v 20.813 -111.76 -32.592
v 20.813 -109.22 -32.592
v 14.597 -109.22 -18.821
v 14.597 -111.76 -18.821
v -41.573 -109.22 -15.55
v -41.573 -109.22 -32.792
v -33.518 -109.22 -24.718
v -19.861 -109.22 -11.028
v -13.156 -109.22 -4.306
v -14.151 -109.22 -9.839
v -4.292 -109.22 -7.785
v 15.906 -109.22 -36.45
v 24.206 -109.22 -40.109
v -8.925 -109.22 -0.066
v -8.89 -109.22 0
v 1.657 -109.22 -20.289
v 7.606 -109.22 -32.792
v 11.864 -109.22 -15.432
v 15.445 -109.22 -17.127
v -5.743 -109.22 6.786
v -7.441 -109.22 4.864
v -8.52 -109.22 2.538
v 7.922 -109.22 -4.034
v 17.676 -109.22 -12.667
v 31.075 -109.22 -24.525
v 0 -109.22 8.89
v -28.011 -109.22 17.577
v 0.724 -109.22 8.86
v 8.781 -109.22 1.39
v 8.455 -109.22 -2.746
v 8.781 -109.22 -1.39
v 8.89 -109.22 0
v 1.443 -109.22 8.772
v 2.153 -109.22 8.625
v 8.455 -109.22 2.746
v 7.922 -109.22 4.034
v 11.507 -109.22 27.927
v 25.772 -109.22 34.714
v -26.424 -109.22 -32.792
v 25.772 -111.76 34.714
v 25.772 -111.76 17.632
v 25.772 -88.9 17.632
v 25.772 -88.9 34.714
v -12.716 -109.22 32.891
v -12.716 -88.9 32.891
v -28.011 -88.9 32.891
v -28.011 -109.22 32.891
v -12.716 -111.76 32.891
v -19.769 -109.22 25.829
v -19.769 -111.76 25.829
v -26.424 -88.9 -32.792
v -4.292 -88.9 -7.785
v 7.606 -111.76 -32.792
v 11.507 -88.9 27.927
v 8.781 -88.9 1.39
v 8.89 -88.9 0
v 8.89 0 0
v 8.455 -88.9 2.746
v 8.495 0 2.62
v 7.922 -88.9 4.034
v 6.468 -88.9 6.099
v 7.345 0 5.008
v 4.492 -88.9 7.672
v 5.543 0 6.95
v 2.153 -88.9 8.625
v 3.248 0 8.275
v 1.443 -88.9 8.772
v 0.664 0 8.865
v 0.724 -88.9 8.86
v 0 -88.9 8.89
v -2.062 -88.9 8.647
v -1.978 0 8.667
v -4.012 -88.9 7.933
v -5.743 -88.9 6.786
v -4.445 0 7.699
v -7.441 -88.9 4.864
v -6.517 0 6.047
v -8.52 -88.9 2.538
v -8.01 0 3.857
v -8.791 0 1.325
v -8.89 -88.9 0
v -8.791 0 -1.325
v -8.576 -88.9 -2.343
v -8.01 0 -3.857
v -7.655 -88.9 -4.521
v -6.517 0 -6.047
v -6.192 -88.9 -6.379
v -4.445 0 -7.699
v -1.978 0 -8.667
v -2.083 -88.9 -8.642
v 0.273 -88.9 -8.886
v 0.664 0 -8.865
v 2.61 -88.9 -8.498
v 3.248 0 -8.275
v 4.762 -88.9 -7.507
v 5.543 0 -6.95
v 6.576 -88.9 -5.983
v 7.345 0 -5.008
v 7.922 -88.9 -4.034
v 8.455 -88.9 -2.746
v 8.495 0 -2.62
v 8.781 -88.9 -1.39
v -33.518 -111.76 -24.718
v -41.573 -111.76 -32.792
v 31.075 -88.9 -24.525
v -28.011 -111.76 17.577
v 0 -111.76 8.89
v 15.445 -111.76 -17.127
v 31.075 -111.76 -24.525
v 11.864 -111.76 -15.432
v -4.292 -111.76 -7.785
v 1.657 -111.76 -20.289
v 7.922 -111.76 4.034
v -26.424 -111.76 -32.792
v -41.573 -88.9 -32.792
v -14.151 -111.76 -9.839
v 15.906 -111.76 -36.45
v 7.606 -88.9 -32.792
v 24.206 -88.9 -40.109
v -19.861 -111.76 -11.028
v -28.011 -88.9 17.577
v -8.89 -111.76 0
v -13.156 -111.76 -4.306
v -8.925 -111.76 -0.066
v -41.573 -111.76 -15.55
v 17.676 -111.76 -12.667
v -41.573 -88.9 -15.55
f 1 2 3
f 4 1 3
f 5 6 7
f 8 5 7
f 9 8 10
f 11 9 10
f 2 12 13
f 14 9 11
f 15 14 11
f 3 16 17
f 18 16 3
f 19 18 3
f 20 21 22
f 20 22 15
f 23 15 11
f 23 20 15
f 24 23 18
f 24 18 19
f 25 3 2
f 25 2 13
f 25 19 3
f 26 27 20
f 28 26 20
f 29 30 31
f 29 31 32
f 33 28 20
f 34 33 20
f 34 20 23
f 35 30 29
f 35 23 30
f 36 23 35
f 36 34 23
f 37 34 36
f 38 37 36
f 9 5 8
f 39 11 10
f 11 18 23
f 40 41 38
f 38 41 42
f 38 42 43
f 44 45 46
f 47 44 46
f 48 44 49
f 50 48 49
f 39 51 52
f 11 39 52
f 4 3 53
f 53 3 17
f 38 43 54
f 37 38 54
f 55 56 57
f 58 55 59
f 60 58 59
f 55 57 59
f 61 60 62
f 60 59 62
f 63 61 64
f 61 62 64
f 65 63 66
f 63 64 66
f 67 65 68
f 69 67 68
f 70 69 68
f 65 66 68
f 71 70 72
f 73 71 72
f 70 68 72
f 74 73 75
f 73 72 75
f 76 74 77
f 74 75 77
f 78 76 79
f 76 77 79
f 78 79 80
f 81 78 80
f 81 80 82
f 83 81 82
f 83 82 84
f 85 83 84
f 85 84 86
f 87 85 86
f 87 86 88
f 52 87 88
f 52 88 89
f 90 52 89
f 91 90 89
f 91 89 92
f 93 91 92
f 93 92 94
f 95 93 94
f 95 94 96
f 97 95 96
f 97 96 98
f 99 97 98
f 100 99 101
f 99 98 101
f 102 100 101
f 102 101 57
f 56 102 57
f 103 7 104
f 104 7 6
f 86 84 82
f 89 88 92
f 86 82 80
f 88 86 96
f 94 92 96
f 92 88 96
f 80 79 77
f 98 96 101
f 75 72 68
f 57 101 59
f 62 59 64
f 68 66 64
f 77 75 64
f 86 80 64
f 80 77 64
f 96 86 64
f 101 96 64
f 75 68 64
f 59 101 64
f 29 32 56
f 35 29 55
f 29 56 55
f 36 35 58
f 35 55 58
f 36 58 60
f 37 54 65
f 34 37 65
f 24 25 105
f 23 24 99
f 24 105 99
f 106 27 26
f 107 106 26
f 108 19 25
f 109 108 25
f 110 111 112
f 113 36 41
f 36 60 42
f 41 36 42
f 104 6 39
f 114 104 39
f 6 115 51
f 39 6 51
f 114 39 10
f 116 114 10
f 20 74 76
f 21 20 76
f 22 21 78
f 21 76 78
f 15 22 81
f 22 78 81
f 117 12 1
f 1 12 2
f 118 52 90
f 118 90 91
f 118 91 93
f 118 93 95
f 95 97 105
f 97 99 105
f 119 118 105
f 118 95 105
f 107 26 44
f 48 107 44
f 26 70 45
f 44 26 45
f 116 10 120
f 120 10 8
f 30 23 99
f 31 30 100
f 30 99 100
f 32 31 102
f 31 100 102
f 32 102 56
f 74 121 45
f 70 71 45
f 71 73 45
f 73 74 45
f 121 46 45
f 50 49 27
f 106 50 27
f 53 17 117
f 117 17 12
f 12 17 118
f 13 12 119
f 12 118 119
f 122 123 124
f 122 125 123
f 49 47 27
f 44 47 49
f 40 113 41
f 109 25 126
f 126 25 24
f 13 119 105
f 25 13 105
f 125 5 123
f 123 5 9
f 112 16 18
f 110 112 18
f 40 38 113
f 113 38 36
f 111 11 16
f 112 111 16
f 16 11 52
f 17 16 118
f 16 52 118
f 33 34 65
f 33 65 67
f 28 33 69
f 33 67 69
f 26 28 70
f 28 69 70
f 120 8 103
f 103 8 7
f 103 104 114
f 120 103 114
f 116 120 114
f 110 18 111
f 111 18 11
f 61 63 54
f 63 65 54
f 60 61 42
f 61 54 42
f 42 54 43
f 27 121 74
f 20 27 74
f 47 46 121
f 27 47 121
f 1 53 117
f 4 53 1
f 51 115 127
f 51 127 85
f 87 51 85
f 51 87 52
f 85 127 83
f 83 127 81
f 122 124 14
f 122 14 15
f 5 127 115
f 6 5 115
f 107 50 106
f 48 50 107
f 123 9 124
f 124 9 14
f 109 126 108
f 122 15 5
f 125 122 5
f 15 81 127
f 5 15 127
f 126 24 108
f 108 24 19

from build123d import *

# Parameters (mm, degrees)
F0_R     = 8.89
F1_DEPTH = 88.9
F4_DEPTH = 20.32
F6_DEPTH = 2.54


with BuildPart() as f1:
    # F0 (on Front) → F1 (new body)
    with BuildSketch(Plane.XZ):
        Circle(F0_R)
    extrude(amount=F1_DEPTH)

    # F2 (on face) → F4 (join)
    with BuildSketch(Plane.XZ.offset(88.9)):
        with BuildLine():
            ThreePointArc((-4.2918766229, -7.7853641568), (-7.6546353008, -4.5209134488), (-8.89, 0))
            Line((-8.89, 0), (-41.5729338972, -15.5504000302))
            Line((-41.5729338972, -15.5504000302), (-41.5729338972, -32.7917784452))
            Line((-41.5729338972, -32.7917784452), (-26.423625648, -32.7917784452))
            Line((-26.423625648, -32.7917784452), (-4.2918766229, -7.7853641568))
        make_face()
        with BuildLine():
            ThreePointArc((7.9221754919, -4.0337619507), (2.6102485031, -8.498158786), (-4.2918766229, -7.7853641568))
            Line((-4.2918766229, -7.7853641568), (7.6060682412, -32.7917784452))
            Line((7.6060682412, -32.7917784452), (24.2062564939, -40.108717978))
            Line((24.2062564939, -40.108717978), (31.0751149996, -24.5251063101))
            Line((31.0751149996, -24.5251063101), (7.9221754919, -4.0337619507))
        make_face()
        with BuildLine():
            Line((11.5068648519, 27.9272308745), (2.152897354, 8.6253772661))
            ThreePointArc((2.152897354, 8.6253772661), (5.536018968, 6.9559035348), (7.9221754919, 4.0337619507))
            Line((7.9221754919, 4.0337619507), (25.771754428, 17.6318820209))
            Line((25.771754428, 17.6318820209), (25.771754428, 34.7144042658))
            Line((25.771754428, 34.7144042658), (11.5068648519, 27.9272308745))
        make_face()
        with BuildLine():
            Line((-28.0105117708, 17.5770223141), (-5.7431249942, 6.7859130042))
            ThreePointArc((-5.7431249942, 6.7859130042), (-3.0582129907, 8.3474207576), (0, 8.89))
            Line((0, 8.89), (-12.7163026482, 32.8911244869))
            Line((-12.7163026482, 32.8911244869), (-28.0105117708, 32.8911244869))
            Line((-28.0105117708, 32.8911244869), (-28.0105117708, 17.5770223141))
        make_face()
        with BuildLine():
            ThreePointArc((-5.7431249942, 6.7859130042), (-8.0650009671, 3.7400346791), (-8.89, 0))
            ThreePointArc((-8.89, 0), (-7.6546353008, -4.5209134488), (-4.2918766229, -7.7853641568))
            ThreePointArc((-4.2918766229, -7.7853641568), (2.6102485031, -8.498158786), (7.9221754919, -4.0337619507))
            ThreePointArc((7.9221754919, -4.0337619507), (8.6446584699, -2.0741214859), (8.89, 0))
            ThreePointArc((8.89, 0), (8.6446584699, 2.0741214859), (7.9221754919, 4.0337619507))
            ThreePointArc((7.9221754919, 4.0337619507), (5.536018968, 6.9559035348), (2.152897354, 8.6253772661))
            ThreePointArc((2.152897354, 8.6253772661), (1.0845497001, 8.823596316), (0, 8.89))
            ThreePointArc((0, 8.89), (-3.0582129907, 8.3474207576), (-5.7431249942, 6.7859130042))
        make_face()
    extrude(amount=F4_DEPTH)

    # F5 (on face) → F6 (join)
    with BuildSketch(Plane.XZ.offset(109.22)):
        Polygon((7.6060682412, -32.7917784452), (15.9061623676, -36.4502482116), (20.813416993, -32.5923874103), (14.5969645539, -18.8207629411), align=None)
        Polygon((-4.2918766229, -7.7853641568), (1.6570958091, -20.288571301), (11.8639794051, -15.4321797825), align=None)
        Polygon((15.4445417704, -17.1269151278), (31.0751149996, -24.5251063101), (17.6763897155, -12.6666598402), align=None)
        Polygon((-26.423625648, -32.7917784452), (-14.1507707051, -9.8388109155), (-19.8614782116, -11.028258101), (-33.5180773118, -24.7176060956), align=None)
        Polygon((-19.7689795686, 25.8292742085), (0, 8.89), (-12.7163026482, 32.8911244869), align=None)
        Polygon((25.771754428, 34.7144042658), (7.9221754919, 4.0337619507), (25.771754428, 17.6318820209), align=None)
        Polygon((-41.5729338972, -32.7917784452), (-26.423625648, -32.7917784452), (-33.5180773118, -24.7176060956), align=None)
        Polygon((-28.0105117708, 17.5770223141), (0, 8.89), (-19.7689795686, 25.8292742085), align=None)
        Polygon((-41.5729338972, -15.5504000302), (-13.1555447136, -4.306243593), (-8.9251107789, -0.0656649632), (-8.89, 0), align=None)
    extrude(amount=F6_DEPTH)


solid = f1.part
